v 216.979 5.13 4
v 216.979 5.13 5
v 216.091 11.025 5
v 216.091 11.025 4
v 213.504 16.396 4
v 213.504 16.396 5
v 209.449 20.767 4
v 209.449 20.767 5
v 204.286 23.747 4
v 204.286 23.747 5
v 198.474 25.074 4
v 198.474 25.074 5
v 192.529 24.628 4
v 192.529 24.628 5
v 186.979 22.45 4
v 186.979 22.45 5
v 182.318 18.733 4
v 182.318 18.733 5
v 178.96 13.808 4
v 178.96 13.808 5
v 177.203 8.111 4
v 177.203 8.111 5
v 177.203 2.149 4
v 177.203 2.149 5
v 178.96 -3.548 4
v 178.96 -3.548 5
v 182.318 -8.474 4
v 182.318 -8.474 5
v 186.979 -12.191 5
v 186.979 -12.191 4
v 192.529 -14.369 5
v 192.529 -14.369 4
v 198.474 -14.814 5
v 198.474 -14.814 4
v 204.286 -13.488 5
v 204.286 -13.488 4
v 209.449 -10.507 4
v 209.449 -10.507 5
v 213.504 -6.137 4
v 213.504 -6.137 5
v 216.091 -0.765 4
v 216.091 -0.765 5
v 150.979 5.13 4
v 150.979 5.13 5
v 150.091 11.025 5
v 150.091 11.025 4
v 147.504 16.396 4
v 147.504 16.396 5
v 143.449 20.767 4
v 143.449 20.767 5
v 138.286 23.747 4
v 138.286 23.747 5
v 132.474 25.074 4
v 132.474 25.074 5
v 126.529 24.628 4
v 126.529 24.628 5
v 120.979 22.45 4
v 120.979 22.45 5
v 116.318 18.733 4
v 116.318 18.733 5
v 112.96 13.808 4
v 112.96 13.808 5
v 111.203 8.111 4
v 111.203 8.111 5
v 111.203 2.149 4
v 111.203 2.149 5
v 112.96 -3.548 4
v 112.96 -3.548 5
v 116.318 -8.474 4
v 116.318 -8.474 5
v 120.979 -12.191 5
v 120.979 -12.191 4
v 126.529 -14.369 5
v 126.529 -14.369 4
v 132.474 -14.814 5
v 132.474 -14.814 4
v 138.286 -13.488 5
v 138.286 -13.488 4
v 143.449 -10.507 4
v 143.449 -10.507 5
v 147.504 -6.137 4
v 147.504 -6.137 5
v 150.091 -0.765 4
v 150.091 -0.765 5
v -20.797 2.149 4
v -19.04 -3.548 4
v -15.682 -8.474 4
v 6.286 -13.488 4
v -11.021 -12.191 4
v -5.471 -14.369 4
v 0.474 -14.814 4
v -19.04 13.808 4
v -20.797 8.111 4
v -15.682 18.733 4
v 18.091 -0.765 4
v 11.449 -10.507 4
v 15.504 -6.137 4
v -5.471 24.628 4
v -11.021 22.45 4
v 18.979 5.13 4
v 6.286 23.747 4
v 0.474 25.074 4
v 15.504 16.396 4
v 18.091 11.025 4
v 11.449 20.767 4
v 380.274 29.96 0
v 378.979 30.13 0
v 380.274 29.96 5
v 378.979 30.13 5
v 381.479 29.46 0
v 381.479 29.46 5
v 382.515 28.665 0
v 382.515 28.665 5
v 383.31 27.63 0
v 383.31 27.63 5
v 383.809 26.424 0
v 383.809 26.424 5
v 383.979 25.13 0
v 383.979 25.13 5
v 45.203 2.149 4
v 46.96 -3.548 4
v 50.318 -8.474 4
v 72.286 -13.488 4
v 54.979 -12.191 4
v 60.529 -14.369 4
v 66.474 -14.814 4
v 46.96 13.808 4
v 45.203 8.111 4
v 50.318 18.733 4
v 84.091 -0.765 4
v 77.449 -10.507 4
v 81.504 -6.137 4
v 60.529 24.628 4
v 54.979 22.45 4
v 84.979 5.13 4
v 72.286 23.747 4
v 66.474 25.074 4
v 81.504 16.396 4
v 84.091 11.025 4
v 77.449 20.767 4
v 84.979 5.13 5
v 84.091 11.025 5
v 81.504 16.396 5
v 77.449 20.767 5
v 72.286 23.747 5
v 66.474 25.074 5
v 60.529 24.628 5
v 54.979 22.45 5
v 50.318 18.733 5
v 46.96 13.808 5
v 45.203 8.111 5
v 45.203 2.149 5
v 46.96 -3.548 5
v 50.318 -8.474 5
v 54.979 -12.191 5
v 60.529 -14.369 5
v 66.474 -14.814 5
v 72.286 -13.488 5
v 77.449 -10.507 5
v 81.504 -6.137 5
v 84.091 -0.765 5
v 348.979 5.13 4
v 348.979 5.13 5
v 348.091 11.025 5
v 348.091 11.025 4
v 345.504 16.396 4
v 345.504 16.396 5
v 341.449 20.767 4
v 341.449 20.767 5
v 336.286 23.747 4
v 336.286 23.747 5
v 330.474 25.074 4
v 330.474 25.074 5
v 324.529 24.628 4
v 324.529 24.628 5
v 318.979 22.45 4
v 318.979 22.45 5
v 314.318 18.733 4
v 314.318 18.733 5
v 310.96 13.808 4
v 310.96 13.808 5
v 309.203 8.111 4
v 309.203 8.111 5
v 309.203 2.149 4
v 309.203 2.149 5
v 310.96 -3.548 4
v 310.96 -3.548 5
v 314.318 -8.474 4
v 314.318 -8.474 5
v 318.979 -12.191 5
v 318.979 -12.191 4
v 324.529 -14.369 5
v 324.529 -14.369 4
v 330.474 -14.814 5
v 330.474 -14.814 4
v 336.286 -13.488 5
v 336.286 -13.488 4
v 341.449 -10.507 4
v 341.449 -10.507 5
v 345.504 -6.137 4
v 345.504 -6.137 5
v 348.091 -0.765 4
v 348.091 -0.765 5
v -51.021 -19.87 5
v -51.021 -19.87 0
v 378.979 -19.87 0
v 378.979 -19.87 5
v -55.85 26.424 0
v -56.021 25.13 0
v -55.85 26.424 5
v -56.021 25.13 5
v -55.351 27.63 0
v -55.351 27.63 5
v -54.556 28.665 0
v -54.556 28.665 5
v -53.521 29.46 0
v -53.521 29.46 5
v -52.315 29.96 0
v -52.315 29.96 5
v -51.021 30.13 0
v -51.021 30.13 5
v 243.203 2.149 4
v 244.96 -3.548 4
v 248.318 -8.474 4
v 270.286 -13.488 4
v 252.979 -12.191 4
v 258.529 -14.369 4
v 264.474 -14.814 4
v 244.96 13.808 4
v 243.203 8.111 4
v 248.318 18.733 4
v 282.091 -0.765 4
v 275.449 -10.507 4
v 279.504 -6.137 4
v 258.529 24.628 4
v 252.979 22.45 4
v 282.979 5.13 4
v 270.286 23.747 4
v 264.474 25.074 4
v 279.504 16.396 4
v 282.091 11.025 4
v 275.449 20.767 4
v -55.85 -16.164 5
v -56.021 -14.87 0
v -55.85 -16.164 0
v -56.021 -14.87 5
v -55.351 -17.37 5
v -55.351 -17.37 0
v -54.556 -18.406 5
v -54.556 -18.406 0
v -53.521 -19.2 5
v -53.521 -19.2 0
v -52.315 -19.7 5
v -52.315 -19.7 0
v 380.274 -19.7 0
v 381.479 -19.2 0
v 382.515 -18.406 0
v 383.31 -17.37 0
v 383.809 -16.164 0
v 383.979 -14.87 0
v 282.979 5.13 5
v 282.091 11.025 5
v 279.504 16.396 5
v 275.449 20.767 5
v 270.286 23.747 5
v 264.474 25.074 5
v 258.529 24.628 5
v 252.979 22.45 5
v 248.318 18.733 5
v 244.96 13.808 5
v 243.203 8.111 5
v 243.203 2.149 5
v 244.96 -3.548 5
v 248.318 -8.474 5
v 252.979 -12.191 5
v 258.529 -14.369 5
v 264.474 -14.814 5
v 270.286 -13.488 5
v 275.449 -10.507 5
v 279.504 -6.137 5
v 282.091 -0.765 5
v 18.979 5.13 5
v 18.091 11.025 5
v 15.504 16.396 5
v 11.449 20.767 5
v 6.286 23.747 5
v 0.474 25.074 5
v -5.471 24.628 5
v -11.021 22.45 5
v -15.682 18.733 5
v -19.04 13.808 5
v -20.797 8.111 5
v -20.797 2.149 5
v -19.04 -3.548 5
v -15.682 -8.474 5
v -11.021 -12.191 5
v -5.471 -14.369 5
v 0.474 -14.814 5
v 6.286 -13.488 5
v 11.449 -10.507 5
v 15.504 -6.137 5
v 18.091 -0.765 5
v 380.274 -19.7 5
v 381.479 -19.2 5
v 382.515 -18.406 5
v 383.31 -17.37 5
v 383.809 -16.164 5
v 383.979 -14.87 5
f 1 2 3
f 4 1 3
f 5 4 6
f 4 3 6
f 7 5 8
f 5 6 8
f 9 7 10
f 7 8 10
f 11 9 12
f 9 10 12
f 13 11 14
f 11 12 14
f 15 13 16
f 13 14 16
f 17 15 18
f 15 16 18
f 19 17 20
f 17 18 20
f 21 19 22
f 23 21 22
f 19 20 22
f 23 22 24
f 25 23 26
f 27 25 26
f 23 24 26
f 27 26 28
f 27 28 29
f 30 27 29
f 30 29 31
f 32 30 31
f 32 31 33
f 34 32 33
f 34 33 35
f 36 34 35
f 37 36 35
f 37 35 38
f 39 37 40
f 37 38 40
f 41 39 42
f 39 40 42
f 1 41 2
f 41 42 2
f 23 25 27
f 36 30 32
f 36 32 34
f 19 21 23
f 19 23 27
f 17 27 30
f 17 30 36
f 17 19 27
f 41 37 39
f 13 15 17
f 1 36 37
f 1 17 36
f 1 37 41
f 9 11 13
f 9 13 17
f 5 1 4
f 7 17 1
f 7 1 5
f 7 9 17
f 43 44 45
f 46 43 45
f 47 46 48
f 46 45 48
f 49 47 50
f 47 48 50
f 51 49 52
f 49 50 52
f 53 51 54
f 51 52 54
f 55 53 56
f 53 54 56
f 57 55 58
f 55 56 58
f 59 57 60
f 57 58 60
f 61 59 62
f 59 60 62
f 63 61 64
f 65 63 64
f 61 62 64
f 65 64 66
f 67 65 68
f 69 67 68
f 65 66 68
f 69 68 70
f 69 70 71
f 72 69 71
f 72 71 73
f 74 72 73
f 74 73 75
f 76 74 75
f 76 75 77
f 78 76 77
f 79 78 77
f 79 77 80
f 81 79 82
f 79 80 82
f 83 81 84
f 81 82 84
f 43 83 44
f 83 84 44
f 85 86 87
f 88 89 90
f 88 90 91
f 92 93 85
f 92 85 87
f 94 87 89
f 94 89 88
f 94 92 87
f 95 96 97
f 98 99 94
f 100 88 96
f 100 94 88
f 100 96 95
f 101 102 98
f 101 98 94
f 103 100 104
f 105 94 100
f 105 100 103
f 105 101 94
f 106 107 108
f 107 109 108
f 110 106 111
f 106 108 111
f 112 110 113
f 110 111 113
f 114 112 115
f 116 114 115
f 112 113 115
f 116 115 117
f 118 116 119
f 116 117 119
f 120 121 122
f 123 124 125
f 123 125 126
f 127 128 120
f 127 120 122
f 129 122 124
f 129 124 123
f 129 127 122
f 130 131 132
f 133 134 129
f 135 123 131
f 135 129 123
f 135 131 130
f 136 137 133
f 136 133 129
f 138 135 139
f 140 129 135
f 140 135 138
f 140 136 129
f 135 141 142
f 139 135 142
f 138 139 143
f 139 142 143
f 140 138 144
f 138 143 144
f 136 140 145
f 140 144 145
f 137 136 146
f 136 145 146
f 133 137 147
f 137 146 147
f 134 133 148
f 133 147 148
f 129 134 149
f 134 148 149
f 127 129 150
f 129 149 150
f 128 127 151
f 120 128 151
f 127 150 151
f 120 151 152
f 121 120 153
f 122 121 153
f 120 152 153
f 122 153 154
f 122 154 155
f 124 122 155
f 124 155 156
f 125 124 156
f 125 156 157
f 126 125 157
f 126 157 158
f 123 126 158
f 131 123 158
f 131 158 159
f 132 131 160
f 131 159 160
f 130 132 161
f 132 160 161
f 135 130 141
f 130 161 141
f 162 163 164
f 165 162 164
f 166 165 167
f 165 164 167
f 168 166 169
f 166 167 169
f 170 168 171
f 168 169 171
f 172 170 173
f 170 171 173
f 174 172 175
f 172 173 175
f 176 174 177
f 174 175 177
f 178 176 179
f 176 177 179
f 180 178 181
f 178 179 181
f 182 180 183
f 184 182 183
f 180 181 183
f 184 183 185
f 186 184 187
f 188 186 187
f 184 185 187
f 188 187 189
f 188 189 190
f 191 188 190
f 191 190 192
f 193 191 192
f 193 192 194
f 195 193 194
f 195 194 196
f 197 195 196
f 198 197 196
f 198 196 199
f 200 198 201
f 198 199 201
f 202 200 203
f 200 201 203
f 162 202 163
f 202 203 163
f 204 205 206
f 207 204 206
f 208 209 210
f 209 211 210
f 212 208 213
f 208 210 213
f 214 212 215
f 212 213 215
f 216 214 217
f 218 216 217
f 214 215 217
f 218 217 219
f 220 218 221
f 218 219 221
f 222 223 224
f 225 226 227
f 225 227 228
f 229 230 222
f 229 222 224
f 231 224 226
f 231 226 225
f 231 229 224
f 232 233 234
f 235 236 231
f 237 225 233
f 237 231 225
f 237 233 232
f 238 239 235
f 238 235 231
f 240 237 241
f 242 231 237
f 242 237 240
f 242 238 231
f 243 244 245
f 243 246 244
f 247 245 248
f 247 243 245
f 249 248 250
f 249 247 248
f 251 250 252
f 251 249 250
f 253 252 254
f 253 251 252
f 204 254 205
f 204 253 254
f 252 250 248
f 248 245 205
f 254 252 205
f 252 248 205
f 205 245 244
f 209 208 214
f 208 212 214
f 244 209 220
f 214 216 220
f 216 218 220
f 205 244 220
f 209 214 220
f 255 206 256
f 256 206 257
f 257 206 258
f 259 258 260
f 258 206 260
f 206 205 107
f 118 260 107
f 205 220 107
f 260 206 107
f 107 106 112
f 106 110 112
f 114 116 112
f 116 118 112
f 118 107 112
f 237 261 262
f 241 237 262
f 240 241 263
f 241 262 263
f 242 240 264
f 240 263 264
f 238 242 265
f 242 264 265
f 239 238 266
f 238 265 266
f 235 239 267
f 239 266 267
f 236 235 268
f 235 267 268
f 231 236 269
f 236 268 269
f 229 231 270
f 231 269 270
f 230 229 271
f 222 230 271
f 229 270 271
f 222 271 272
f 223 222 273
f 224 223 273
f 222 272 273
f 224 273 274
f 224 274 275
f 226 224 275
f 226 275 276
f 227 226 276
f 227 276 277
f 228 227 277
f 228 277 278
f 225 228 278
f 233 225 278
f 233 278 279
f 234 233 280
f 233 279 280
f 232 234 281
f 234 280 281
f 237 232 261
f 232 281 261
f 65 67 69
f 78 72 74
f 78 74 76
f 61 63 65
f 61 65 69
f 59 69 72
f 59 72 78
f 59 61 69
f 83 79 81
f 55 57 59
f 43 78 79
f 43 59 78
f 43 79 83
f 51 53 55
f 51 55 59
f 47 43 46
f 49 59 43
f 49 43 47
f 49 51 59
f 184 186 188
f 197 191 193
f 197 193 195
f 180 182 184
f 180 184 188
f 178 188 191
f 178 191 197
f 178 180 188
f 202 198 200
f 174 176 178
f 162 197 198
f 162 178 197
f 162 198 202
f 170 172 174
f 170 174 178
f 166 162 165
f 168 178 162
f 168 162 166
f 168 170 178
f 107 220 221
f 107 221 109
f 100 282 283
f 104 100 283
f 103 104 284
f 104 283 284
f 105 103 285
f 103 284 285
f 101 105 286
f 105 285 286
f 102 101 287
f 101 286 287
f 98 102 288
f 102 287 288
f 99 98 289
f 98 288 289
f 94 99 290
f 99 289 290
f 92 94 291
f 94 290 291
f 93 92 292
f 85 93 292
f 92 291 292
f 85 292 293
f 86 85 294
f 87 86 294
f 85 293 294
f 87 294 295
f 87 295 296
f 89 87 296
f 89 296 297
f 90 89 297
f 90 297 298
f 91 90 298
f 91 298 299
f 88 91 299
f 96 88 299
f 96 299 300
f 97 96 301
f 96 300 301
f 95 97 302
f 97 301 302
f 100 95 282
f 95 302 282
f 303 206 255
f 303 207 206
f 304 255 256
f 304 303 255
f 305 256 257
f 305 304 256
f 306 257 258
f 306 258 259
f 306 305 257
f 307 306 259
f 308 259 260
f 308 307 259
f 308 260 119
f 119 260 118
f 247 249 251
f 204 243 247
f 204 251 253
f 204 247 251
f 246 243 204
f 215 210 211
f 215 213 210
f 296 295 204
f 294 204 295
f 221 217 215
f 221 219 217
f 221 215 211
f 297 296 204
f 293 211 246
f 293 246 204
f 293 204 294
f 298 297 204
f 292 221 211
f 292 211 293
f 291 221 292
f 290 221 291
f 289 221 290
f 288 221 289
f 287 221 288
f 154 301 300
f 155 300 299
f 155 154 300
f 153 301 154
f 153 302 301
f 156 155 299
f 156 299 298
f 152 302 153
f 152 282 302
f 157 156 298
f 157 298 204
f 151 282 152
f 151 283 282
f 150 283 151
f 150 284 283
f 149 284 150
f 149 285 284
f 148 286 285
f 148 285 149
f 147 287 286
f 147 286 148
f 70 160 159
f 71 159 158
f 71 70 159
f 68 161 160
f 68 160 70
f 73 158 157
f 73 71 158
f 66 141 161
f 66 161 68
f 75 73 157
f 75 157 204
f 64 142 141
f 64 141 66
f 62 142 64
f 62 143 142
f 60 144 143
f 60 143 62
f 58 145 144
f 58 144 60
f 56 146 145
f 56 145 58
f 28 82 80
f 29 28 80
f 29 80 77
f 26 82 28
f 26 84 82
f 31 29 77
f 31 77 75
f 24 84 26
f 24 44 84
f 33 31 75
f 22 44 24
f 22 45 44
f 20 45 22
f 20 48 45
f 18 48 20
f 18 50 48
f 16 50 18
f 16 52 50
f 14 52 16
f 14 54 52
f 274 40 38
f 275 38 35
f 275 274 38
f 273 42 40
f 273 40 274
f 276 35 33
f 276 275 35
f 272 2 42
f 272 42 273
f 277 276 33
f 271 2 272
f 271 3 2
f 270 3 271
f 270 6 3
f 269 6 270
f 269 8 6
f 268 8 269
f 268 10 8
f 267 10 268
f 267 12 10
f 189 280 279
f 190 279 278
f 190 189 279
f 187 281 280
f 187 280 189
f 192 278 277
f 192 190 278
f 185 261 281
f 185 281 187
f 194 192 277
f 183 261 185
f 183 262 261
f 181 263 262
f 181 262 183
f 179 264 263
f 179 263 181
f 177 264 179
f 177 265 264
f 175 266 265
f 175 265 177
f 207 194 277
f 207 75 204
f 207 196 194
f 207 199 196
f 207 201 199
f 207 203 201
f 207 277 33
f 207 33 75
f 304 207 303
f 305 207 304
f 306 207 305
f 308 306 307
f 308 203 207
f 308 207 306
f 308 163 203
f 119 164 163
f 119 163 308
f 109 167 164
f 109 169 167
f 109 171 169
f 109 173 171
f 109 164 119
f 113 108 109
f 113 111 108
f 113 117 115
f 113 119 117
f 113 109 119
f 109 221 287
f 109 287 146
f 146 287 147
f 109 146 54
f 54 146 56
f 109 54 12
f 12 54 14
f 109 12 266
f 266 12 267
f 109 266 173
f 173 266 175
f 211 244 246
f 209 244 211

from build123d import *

# Parameters (mm, degrees)
SKETCH_W            = 440
SKETCH_H            = 50
PAD_DEPTH           = 5
SKETCH001_R         = 20
POCKET_DEPTH        = 1
LINEARPATTERN_COUNT = 6
LINEARPATTERN_PITCH = 66
FILLET_R            = 5
FILLET001_R         = 5


with BuildPart() as part:
    # Sketch → Pad (new body)
    with BuildSketch(Plane.XY):
        with Locations((163.979408, 5.129884)):
            Rectangle(SKETCH_W, SKETCH_H)
    extrude(amount=PAD_DEPTH)

    # Sketch001 → Pocket (cut)
    with BuildSketch(Plane.XY.offset(5)):
        with Locations((-1.020592, 5.129884)):
            Circle(SKETCH001_R)
    pocket = extrude(amount=-POCKET_DEPTH, mode=Mode.SUBTRACT)

    # LinearPattern: Pocket ×6
    with Locations(*[(i * LINEARPATTERN_PITCH, 0, 0) for i in range(1, LINEARPATTERN_COUNT)]):
        add(pocket, mode=Mode.SUBTRACT)

    # Fillet
    fillet_edges = [part.edges().sort_by_distance(p)[0] for p in [
        (-56.020592, 30.129884, 2.5),
        (383.979408, -19.870116, 2.5),
        (383.979408, 30.129884, 2.5),
    ]]
    fillet(fillet_edges, radius=FILLET_R)

    # Fillet001
    fillet001_edges = [part.edges().sort_by_distance(p)[0] for p in [
        (-56.020592, -19.870116, 2.5),
    ]]
    fillet(fillet001_edges, radius=FILLET001_R)


solid = part.part
